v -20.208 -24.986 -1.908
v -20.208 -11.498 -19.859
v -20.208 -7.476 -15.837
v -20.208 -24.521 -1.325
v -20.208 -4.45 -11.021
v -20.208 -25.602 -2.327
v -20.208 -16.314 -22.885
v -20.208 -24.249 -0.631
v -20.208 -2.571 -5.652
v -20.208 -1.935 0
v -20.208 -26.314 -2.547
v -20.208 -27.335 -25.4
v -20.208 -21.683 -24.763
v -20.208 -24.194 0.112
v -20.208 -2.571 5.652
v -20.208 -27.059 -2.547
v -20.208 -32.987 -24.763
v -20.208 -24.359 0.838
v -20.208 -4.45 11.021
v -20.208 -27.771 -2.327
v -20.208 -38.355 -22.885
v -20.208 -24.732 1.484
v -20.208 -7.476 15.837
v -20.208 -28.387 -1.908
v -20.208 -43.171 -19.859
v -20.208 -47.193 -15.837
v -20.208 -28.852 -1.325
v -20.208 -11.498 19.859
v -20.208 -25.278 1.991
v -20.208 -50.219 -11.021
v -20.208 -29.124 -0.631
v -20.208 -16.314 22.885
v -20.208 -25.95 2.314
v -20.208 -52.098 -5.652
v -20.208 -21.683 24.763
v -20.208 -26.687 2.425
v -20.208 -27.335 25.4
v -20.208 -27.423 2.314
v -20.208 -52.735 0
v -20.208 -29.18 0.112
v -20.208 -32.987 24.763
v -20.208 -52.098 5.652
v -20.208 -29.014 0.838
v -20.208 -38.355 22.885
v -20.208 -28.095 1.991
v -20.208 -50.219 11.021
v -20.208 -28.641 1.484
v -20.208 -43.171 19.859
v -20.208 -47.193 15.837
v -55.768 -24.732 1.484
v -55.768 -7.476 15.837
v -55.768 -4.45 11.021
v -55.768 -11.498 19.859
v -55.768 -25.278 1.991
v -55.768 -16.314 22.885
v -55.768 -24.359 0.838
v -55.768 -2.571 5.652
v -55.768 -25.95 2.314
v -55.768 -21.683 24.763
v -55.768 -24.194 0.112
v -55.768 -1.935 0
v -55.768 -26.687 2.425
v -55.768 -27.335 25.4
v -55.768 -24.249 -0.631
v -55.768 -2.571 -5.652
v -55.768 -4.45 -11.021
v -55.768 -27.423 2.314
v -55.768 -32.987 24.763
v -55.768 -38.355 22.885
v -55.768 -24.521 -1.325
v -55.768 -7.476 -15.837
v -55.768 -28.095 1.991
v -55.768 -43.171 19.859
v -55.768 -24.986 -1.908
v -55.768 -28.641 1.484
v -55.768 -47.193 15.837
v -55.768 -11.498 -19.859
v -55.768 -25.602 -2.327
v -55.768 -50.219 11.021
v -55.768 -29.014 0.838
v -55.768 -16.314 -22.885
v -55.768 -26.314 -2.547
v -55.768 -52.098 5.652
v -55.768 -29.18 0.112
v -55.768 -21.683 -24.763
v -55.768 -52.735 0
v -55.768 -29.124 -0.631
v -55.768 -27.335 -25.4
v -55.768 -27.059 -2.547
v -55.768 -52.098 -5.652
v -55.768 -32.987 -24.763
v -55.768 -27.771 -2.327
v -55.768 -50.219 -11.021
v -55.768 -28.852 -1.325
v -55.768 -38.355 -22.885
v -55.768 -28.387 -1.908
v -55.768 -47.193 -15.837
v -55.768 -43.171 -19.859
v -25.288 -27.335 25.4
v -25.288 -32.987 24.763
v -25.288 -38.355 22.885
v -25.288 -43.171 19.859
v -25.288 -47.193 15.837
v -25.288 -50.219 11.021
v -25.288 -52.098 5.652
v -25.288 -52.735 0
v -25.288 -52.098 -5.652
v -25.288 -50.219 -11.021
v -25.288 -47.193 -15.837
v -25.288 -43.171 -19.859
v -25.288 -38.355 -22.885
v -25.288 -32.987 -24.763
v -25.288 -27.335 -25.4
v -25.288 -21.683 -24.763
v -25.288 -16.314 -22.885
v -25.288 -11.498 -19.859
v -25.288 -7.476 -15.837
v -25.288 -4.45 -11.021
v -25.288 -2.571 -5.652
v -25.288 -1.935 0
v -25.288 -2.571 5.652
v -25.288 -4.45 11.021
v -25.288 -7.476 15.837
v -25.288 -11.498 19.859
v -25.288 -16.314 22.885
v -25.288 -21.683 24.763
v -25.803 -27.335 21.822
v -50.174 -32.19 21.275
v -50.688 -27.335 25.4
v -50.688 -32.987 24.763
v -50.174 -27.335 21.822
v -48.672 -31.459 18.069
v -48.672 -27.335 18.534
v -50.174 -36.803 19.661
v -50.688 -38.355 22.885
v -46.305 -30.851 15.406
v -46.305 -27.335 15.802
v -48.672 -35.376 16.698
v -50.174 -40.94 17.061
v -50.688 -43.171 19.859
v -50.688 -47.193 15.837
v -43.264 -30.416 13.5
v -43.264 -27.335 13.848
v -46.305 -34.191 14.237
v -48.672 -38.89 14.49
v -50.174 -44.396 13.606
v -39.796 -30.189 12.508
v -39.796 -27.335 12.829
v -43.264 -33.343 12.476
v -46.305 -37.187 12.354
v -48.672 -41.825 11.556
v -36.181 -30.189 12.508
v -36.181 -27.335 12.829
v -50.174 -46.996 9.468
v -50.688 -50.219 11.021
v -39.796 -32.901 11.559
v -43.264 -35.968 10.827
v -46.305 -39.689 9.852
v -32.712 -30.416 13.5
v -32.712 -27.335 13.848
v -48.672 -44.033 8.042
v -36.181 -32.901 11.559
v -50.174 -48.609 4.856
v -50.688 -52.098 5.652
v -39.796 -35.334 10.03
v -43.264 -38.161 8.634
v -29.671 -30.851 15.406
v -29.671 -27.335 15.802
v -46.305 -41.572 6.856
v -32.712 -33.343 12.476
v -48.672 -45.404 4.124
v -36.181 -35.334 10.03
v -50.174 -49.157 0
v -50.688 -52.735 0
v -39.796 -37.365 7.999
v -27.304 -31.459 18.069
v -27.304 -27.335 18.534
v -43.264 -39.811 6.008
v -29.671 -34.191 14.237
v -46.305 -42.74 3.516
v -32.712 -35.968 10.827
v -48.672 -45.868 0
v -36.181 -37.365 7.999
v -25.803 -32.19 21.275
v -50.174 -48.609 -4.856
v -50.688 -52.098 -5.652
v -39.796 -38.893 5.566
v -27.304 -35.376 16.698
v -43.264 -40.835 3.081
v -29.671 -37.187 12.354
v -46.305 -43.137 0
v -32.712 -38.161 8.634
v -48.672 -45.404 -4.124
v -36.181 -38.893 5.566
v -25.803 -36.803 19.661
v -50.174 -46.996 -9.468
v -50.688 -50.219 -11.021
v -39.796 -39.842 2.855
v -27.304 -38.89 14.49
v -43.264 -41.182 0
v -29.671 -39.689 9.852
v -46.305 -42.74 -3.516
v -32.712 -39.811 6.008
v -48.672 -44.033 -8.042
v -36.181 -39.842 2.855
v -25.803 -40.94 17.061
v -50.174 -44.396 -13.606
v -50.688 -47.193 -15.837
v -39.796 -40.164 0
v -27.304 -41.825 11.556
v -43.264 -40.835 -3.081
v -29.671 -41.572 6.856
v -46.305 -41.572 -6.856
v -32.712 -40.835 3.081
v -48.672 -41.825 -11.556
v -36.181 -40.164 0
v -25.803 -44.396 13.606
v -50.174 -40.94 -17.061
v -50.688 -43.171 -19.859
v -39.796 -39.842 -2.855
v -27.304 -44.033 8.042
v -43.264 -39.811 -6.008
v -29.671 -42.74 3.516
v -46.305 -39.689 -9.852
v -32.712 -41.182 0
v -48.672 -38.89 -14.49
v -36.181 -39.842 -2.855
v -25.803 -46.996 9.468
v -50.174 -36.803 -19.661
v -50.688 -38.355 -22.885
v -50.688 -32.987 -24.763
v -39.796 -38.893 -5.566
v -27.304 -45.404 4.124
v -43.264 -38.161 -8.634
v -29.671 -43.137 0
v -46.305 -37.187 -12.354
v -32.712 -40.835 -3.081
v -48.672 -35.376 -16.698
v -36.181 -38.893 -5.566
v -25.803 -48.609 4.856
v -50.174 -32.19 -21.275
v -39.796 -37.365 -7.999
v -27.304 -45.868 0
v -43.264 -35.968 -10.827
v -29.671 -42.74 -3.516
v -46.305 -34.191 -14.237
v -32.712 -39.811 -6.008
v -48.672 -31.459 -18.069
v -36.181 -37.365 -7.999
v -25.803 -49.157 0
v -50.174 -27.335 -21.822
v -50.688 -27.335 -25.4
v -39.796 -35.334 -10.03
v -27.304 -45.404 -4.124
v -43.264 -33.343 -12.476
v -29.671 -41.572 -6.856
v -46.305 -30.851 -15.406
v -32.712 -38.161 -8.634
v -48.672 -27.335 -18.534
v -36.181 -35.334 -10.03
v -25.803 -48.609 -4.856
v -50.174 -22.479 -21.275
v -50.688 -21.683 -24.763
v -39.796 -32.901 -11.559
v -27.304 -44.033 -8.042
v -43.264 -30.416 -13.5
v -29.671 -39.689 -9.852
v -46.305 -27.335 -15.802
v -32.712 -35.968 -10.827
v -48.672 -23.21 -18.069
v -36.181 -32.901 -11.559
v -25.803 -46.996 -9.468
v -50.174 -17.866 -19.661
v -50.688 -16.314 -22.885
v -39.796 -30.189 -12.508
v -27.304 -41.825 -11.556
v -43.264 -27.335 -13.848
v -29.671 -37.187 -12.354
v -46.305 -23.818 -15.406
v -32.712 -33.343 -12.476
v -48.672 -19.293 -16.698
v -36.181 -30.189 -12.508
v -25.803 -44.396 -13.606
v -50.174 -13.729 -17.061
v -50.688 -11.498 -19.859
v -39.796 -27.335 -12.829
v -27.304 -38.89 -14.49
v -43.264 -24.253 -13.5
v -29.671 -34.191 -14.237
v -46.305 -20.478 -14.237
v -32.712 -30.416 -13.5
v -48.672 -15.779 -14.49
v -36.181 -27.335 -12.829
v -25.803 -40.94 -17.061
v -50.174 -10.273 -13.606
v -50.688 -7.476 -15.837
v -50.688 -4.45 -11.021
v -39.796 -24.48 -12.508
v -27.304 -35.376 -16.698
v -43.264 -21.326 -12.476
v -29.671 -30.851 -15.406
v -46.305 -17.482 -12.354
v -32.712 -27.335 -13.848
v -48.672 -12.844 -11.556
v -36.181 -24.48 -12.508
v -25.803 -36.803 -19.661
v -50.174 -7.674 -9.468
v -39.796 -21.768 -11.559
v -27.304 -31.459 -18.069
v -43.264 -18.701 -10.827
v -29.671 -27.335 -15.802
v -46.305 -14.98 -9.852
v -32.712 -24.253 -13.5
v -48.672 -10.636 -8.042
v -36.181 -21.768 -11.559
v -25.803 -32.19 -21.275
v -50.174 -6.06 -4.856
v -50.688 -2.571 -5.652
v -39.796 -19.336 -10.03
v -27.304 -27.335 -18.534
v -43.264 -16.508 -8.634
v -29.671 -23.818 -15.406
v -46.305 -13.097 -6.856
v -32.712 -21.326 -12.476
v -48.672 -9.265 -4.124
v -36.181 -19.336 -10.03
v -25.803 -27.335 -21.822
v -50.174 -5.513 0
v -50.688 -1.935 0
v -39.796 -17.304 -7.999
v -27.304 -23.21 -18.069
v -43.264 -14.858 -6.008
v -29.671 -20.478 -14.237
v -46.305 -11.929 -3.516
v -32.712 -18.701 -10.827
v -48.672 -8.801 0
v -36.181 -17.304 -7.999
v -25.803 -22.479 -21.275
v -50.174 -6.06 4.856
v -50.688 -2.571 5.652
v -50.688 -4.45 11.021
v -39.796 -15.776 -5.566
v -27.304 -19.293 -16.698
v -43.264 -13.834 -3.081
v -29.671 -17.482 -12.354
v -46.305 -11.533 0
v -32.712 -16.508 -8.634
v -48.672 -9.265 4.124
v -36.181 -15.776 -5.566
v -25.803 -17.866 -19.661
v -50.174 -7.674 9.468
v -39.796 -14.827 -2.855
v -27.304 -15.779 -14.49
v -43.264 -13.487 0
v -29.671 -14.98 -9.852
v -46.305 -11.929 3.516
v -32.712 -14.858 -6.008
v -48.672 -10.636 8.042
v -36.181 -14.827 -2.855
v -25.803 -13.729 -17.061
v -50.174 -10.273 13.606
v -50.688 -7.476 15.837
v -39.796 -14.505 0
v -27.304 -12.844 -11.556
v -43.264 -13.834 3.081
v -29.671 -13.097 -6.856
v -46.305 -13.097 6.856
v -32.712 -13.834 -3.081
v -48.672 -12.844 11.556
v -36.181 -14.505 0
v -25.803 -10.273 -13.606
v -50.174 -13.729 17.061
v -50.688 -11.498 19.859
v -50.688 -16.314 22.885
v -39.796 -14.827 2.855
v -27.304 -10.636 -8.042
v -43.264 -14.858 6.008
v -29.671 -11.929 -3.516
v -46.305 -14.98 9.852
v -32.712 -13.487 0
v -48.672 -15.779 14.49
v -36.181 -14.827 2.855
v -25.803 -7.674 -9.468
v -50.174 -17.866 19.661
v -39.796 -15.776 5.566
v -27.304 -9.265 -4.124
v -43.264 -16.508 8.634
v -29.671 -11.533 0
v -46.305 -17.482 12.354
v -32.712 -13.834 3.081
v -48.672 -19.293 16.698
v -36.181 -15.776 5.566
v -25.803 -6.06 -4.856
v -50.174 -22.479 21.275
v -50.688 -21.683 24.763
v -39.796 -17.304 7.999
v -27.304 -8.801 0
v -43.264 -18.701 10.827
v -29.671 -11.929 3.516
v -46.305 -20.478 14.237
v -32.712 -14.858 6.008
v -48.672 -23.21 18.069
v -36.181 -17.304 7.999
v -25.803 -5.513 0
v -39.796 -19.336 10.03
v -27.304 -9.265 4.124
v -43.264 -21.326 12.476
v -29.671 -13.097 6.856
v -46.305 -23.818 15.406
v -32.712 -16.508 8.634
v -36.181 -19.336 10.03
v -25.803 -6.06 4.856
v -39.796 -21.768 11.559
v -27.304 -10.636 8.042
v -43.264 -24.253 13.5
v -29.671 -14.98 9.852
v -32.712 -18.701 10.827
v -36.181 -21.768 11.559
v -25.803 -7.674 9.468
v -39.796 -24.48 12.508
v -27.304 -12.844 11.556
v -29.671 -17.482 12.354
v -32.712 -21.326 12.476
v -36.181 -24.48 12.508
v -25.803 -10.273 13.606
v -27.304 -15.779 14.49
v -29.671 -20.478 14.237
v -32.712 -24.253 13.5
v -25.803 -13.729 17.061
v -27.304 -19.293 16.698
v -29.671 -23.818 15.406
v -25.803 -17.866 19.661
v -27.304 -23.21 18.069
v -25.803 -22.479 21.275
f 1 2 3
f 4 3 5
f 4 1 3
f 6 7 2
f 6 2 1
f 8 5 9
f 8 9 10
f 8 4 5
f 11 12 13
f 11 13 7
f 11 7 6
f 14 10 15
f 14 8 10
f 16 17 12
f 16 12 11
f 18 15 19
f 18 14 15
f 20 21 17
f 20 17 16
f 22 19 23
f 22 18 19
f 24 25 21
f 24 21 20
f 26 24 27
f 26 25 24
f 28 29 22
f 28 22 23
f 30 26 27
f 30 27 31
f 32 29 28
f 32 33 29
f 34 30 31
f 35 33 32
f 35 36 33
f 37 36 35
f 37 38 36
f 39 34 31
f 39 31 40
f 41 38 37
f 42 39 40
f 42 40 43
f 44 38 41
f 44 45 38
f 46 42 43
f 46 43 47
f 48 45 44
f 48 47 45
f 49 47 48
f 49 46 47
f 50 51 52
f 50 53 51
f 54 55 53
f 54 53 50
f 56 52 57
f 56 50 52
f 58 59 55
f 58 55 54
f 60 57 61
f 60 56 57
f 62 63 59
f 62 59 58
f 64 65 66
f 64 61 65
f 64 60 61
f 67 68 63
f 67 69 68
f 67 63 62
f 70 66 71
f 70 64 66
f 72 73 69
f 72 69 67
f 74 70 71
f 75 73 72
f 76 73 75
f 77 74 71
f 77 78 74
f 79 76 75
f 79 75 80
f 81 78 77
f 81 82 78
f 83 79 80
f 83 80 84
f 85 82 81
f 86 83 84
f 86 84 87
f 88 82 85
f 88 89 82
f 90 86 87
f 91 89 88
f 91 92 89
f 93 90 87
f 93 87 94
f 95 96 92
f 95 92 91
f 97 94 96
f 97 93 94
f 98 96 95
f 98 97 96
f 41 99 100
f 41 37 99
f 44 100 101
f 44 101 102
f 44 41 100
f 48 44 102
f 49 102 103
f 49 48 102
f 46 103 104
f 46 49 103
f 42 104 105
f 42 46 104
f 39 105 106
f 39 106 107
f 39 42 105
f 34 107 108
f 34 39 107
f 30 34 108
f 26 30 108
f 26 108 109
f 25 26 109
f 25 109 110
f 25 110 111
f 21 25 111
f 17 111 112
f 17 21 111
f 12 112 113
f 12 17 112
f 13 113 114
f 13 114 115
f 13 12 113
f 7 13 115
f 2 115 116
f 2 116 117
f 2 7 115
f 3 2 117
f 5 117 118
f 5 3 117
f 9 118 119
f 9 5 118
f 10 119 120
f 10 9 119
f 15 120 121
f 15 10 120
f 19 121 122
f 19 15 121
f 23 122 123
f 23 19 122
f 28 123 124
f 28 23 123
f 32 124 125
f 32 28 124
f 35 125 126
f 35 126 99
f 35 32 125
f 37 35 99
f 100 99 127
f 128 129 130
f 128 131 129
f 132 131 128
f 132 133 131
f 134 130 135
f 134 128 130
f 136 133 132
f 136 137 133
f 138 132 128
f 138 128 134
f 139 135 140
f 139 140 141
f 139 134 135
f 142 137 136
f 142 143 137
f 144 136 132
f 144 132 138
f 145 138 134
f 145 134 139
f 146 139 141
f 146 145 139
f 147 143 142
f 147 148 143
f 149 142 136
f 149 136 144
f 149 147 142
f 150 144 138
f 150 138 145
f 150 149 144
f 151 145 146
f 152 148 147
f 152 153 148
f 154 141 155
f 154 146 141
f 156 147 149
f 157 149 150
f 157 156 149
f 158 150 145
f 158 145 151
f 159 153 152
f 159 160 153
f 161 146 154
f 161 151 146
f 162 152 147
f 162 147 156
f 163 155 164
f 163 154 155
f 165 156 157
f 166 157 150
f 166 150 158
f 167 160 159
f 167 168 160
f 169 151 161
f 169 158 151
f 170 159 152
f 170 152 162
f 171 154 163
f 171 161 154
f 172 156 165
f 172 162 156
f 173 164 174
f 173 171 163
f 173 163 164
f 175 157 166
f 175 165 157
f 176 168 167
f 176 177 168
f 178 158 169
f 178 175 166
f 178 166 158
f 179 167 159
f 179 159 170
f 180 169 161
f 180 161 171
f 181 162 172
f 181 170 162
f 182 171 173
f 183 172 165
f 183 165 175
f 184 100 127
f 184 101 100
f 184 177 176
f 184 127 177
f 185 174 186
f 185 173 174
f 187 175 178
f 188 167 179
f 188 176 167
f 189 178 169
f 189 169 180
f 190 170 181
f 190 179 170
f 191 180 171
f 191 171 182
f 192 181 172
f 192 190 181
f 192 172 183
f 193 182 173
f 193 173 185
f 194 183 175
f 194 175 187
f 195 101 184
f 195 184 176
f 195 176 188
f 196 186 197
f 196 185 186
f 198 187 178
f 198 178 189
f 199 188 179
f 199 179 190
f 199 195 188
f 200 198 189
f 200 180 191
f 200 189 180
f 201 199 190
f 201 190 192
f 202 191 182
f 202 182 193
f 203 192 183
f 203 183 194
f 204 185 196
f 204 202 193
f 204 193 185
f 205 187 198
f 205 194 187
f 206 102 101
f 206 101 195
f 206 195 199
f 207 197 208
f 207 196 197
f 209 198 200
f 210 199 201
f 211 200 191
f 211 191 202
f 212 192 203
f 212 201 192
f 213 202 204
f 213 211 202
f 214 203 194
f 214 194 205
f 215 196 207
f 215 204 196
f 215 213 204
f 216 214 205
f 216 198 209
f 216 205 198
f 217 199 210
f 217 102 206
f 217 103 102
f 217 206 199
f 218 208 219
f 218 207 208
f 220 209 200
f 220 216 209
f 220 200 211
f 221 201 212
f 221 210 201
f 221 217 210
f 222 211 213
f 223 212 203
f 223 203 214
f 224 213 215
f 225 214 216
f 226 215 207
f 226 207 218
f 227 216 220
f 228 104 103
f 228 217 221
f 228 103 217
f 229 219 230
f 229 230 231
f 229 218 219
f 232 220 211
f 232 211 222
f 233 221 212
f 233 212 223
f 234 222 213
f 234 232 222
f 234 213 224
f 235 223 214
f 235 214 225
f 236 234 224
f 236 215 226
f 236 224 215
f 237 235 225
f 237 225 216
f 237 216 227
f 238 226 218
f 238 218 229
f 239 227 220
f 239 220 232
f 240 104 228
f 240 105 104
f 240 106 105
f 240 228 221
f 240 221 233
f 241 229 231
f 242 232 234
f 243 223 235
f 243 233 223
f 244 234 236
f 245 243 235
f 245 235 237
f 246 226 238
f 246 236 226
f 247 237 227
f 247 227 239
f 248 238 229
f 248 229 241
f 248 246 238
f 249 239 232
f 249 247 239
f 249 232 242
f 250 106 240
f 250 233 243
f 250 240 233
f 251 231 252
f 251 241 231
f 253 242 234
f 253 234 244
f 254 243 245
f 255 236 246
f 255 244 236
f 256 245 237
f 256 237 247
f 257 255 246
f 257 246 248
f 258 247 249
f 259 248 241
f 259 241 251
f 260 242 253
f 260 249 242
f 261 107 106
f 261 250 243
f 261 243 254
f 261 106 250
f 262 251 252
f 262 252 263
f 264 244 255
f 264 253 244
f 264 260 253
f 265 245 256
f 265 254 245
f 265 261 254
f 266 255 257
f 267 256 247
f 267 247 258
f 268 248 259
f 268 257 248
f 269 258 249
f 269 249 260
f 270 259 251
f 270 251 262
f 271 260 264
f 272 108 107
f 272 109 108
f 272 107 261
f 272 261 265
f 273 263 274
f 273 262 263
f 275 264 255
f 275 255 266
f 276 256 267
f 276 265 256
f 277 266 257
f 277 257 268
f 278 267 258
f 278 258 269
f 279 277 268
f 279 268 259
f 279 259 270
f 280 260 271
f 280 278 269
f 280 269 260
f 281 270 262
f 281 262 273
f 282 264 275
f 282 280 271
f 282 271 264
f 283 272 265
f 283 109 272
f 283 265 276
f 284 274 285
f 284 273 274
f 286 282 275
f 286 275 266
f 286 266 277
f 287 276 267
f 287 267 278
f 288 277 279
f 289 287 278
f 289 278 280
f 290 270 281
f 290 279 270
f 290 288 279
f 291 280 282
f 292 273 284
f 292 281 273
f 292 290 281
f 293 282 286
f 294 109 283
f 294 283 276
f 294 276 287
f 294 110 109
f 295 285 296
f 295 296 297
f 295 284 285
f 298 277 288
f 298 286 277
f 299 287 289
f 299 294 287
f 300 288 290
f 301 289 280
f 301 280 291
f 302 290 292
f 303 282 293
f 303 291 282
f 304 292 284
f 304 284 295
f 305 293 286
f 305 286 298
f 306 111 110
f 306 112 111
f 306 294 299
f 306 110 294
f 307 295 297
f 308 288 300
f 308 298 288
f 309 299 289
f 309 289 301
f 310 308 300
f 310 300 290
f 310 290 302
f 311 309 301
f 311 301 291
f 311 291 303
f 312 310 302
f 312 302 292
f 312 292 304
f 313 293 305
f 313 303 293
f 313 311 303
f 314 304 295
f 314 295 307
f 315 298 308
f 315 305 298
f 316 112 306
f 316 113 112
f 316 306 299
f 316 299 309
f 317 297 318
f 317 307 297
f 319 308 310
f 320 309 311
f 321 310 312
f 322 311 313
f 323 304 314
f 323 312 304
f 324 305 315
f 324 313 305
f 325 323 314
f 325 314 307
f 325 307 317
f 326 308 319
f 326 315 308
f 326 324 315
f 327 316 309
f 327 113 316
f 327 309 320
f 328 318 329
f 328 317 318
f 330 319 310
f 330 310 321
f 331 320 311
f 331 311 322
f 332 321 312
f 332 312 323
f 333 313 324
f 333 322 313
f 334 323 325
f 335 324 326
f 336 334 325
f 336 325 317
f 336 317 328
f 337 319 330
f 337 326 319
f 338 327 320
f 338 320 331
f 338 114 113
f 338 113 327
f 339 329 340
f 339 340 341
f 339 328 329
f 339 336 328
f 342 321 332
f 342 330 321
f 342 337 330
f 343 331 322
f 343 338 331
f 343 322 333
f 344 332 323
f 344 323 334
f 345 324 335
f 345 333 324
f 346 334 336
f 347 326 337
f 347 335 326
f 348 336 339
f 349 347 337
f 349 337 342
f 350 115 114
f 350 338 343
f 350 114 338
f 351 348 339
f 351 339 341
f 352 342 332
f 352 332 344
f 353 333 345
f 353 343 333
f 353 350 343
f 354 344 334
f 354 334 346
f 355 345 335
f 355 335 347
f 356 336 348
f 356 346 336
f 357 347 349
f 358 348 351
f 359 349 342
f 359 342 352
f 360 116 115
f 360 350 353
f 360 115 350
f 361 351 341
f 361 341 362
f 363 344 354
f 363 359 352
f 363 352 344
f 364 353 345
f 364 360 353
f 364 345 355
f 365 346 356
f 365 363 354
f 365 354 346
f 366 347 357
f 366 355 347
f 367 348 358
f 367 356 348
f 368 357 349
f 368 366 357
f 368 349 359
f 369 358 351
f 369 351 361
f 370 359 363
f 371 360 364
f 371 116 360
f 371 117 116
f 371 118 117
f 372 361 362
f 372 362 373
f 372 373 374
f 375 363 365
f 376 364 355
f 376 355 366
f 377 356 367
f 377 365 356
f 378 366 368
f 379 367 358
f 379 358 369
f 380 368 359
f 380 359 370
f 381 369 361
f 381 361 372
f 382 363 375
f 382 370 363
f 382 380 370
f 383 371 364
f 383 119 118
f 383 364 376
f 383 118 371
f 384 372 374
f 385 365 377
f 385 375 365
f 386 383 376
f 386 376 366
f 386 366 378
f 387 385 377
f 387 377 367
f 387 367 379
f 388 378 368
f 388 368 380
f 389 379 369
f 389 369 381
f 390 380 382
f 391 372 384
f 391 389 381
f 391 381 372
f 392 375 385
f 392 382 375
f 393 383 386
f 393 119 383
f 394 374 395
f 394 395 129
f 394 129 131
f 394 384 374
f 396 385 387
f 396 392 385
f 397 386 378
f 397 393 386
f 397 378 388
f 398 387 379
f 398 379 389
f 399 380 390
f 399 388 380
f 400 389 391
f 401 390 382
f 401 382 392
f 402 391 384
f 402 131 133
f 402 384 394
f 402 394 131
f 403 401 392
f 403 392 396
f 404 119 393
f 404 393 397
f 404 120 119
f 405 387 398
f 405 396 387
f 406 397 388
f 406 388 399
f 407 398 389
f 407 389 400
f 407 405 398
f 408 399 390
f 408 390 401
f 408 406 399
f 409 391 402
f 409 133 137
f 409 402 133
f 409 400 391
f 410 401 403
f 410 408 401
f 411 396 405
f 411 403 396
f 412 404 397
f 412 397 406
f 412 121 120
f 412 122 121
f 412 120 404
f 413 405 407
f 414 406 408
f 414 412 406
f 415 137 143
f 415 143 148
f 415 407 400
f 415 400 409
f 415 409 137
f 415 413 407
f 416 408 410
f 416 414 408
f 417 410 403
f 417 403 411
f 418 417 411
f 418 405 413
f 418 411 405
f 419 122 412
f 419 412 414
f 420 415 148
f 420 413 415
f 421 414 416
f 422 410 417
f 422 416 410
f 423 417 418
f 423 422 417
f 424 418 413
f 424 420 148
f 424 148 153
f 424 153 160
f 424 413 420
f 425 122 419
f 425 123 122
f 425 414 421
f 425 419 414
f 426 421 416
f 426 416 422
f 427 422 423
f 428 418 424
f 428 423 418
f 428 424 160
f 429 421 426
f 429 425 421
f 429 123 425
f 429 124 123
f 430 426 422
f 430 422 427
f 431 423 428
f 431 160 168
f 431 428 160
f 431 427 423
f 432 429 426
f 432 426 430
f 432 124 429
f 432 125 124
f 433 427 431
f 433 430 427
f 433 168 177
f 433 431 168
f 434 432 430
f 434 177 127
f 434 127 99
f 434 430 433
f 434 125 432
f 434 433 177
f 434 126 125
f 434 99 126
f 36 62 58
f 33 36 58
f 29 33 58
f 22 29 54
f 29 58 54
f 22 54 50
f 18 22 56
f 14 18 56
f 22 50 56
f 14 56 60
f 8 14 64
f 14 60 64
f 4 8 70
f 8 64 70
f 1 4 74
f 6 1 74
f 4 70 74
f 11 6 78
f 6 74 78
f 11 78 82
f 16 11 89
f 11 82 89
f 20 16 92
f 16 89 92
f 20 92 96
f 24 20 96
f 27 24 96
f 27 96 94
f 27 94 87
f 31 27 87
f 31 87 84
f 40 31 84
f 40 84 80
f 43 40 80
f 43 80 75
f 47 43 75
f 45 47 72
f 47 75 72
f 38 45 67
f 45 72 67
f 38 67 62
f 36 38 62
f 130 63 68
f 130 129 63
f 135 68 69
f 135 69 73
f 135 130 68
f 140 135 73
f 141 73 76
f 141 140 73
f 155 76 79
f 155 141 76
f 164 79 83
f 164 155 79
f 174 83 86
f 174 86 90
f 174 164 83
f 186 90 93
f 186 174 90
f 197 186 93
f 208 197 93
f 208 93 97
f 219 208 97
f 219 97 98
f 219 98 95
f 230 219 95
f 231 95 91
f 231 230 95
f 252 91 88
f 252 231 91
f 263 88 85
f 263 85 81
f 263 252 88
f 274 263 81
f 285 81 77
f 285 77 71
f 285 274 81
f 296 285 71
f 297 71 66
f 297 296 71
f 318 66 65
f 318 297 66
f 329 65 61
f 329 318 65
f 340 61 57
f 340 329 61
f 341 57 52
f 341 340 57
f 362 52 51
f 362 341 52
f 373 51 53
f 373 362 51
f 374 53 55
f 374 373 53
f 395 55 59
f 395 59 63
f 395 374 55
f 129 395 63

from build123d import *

# Parameters (mm, degrees)
F_97_0_0059_DIAMETER_HOLE2_D = 0.14986
SKETCH5_R                    = 2.5
CUT_EXTRUDE2_DEPTH           = 35.56


with BuildPart() as part:
    # Sketch1 → Revolve1 (revolve)
    with BuildSketch(Plane.XY, mode=Mode.PRIVATE) as revolve1_sk:
        with BuildLine():
            Line((-55.768127135, -1.934587814), (-50.688127135, -1.934587814))
            ThreePointArc((-50.688127135, -1.934587814), (-37.988127135, -14.634587814), (-25.288127135, -1.934587814))
            Line((-25.288127135, -1.934587814), (-20.208127135, -1.934587814))
            Line((-20.208127135, -1.934587814), (-20.208127135, -27.334587814))
            Line((-20.208127135, -27.334587814), (-55.768127135, -27.334587814))
            Line((-55.768127135, -27.334587814), (-55.768127135, -1.934587814))
        make_face()
    revolve(revolve1_sk.sketch.rotate(Axis((-55.768127135, -27.334587814, 0), (1, 0, 0)), 90), axis=Axis((-55.768127135, -27.334587814, 0), (1, 0, 0)))

    # #97 (0.0059) Diameter Hole2 (through all)
    with Locations(Plane.ZY.offset(55.768127135)):
        with Locations((0, -26.686562296)):
            Hole(F_97_0_0059_DIAMETER_HOLE2_D / 2)

    # Sketch5 → Cut-Extrude2 (cut)
    with BuildSketch(Plane.ZY.offset(55.768127135)):
        with Locations((-0.07493, -26.686562296)):
            Circle(SKETCH5_R)
    extrude(amount=-CUT_EXTRUDE2_DEPTH, mode=Mode.SUBTRACT)


solid = part.part
